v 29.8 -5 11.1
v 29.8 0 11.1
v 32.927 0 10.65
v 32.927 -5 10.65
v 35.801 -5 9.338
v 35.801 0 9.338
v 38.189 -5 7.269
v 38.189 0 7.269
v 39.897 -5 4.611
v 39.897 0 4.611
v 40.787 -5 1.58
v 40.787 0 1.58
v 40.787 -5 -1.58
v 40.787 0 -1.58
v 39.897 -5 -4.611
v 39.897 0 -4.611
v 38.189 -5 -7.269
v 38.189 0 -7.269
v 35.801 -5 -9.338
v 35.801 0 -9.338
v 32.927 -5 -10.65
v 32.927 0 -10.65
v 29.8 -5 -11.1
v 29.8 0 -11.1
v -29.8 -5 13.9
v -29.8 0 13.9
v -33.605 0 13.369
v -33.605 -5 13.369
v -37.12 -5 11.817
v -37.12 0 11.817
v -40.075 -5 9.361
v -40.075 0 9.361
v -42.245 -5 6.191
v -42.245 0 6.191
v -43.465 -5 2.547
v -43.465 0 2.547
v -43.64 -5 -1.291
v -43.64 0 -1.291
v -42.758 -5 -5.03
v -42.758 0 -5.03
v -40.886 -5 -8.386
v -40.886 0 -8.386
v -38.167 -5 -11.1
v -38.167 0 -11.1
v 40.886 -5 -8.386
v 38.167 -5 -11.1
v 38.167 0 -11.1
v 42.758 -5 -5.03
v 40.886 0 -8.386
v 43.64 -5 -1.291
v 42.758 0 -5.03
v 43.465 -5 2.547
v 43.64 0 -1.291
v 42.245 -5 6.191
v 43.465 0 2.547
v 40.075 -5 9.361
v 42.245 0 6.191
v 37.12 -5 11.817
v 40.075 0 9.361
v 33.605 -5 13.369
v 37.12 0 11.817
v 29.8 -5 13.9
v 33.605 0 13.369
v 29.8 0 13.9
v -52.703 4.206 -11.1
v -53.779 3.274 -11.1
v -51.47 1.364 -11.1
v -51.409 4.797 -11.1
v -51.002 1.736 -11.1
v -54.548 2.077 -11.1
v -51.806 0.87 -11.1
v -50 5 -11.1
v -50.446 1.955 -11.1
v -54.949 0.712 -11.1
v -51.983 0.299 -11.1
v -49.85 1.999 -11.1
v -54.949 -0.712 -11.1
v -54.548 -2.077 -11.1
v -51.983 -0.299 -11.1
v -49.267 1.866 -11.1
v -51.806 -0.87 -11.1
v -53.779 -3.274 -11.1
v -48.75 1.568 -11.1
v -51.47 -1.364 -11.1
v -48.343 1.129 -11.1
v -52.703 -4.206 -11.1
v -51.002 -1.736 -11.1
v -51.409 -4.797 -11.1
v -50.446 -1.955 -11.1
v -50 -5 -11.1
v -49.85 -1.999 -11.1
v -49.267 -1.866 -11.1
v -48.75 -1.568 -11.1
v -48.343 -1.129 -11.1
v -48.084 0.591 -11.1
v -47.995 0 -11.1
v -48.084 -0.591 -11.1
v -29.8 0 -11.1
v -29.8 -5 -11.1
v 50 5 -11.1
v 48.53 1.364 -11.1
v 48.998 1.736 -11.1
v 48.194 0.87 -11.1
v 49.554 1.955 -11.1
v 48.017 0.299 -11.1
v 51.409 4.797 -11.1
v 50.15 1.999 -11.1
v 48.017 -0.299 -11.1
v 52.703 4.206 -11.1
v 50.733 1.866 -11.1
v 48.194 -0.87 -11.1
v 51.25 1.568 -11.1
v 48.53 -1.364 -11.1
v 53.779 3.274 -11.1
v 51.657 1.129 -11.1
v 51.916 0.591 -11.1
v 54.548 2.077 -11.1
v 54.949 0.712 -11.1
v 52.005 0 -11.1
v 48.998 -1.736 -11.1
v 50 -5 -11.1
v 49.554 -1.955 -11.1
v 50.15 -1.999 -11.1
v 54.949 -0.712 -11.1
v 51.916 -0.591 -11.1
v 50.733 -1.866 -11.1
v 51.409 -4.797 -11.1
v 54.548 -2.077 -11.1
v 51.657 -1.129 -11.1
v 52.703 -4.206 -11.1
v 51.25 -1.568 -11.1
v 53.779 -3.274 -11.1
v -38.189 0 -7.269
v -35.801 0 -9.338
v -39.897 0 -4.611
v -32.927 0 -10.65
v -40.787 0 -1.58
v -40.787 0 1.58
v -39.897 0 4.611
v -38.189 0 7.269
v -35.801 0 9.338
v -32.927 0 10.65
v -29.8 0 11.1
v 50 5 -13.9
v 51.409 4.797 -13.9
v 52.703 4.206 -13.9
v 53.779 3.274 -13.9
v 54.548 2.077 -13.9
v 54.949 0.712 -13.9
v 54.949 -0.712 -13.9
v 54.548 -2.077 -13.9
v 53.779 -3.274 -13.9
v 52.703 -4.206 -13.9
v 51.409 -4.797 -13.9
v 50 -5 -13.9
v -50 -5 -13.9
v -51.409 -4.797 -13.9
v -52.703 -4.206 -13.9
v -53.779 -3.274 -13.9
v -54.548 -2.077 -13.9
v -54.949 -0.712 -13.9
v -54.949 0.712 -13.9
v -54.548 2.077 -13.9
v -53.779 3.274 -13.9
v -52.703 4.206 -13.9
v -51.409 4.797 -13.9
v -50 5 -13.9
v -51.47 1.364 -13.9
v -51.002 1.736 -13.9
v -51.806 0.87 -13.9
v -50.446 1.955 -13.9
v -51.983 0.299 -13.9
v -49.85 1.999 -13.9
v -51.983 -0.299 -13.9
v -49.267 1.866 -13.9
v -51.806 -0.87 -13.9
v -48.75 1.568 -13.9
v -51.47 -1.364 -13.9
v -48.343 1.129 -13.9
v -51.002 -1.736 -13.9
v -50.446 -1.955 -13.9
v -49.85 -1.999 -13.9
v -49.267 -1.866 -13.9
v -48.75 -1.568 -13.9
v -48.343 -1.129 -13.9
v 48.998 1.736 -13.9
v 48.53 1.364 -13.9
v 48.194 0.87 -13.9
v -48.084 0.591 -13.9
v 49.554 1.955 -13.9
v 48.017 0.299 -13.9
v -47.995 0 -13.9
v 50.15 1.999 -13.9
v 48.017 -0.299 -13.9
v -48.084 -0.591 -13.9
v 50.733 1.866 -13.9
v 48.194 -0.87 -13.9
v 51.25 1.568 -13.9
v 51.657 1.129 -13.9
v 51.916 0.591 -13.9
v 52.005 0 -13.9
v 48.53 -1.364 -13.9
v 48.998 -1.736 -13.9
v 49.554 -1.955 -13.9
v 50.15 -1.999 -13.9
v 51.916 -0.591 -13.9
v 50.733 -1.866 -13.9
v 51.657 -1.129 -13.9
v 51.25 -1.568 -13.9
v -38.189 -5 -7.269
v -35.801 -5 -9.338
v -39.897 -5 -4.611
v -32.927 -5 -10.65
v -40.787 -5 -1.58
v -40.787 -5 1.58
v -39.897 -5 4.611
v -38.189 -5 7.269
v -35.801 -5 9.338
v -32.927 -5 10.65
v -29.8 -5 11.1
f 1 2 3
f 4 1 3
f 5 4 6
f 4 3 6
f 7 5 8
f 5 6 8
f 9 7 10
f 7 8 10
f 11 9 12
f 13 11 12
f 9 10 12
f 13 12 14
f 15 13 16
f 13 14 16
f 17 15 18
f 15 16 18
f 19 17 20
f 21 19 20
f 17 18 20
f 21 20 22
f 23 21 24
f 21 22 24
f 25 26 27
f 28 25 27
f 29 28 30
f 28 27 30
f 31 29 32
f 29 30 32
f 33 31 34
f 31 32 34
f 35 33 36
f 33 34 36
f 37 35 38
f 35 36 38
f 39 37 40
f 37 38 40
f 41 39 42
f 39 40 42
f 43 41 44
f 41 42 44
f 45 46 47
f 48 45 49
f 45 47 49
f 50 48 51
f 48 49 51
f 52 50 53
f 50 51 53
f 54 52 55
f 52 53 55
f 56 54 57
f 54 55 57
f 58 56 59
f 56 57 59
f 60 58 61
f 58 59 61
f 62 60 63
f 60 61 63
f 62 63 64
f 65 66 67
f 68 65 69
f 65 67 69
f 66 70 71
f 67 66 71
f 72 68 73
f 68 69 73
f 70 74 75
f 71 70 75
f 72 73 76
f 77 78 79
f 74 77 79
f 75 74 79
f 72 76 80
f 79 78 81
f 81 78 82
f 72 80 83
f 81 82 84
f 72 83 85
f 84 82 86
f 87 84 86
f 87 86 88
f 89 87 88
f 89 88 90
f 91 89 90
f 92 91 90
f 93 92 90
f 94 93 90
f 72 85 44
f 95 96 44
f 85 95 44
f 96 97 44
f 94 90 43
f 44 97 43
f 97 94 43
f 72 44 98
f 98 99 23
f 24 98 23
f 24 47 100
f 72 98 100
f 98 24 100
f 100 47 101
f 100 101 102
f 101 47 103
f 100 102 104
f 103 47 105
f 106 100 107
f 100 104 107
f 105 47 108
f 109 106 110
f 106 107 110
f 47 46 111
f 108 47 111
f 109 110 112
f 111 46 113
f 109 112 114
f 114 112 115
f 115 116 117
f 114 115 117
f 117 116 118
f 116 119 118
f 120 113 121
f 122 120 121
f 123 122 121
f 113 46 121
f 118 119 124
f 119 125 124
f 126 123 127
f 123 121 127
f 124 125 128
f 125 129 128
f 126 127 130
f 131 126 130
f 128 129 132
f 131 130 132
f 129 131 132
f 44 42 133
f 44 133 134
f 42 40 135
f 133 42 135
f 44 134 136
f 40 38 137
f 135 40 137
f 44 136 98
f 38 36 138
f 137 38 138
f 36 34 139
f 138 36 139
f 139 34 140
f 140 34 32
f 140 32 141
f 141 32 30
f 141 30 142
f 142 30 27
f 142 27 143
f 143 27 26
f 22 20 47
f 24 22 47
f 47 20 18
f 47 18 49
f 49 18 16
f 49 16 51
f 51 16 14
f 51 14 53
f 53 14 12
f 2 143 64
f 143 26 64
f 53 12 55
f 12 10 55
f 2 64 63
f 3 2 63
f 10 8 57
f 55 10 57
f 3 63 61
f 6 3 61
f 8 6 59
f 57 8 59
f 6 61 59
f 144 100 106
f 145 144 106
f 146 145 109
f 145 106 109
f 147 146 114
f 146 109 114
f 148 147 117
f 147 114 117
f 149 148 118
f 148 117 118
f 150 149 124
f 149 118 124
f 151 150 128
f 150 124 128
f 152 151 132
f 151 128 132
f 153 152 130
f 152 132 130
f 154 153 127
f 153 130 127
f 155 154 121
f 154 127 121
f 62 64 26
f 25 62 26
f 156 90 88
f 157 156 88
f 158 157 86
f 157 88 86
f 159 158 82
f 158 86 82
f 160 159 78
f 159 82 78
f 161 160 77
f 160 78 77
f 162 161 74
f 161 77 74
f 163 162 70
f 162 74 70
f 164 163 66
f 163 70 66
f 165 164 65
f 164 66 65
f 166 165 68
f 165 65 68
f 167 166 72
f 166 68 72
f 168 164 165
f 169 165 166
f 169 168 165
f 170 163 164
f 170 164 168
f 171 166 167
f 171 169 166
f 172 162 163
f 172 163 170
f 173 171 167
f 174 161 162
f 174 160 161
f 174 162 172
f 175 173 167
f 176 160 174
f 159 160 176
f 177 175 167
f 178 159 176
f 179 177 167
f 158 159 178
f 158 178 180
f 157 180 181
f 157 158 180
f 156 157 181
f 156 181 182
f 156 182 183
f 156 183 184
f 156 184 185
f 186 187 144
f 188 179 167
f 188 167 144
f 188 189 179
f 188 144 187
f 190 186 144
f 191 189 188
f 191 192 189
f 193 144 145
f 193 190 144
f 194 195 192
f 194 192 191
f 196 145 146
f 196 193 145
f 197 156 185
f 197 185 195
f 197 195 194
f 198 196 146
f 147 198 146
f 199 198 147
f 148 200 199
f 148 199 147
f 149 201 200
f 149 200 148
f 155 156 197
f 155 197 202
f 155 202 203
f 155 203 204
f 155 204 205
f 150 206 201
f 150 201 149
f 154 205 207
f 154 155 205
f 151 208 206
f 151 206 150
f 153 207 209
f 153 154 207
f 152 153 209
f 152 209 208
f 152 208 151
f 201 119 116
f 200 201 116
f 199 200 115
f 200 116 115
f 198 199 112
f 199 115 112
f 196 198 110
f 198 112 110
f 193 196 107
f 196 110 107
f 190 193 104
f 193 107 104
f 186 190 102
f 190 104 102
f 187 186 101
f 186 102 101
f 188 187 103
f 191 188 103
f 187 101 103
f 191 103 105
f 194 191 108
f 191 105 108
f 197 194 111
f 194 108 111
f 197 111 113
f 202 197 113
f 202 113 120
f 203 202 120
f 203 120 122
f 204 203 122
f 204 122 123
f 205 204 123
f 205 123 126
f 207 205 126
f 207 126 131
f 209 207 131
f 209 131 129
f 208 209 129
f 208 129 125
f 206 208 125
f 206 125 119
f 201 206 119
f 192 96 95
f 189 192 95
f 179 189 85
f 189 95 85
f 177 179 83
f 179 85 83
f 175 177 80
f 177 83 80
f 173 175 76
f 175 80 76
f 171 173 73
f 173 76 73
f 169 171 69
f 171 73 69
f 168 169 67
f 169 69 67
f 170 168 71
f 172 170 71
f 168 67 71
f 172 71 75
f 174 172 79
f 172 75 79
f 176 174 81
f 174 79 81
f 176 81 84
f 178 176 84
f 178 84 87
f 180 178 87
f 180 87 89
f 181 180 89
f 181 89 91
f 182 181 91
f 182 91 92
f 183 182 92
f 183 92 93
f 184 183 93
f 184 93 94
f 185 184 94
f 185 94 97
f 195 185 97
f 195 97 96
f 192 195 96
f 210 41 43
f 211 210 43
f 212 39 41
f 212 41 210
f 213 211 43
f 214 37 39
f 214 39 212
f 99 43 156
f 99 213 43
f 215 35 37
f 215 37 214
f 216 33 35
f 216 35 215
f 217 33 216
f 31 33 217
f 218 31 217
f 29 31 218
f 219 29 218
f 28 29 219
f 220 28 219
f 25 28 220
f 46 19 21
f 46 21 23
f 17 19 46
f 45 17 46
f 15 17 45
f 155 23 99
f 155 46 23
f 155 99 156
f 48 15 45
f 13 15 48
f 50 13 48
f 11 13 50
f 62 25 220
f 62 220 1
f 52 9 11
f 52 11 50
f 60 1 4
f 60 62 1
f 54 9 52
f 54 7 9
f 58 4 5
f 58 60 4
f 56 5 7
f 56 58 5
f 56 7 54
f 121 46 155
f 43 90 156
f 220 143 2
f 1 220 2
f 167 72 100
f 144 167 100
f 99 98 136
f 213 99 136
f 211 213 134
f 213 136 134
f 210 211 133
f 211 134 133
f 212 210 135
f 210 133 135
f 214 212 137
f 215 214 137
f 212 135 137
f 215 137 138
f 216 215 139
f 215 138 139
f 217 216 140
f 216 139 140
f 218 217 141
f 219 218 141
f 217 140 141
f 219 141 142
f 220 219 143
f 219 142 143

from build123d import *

# Parameters (mm, degrees)
F1_DEPTH = 5
F2_W     = 120
F2_H     = 2.8
F3_DEPTH = 10
F4_R     = 2.005
F5_DEPTH = 2.801
F7_DEPTH = 2.801


with BuildPart() as f1:
    # F0 (on Front) → F1 (new body)
    with BuildSketch(Plane.XZ):
        with BuildLine():
            Line((-29.8, -13.9), (29.8, -13.9))
            ThreePointArc((29.8, -13.9), (43.7, 0), (29.8, 13.9))
            Line((29.8, 13.9), (-29.8, 13.9))
            ThreePointArc((-29.8, 13.9), (-43.7, 0), (-29.8, -13.9))
        make_face()
        with BuildLine():
            ThreePointArc((29.8, 11.1), (40.9, 0), (29.8, -11.1))
            Line((29.8, -11.1), (-29.8, -11.1))
            ThreePointArc((-29.8, -11.1), (-40.9, 0), (-29.8, 11.1))
            Line((-29.8, 11.1), (29.8, 11.1))
        make_face(mode=Mode.SUBTRACT)
    extrude(amount=F1_DEPTH)

    # F2 (on face) → F3 (join)
    with BuildSketch(Plane.XZ.offset(5)):
        with Locations((0, -12.5)):
            Rectangle(F2_W, F2_H)
    extrude(amount=-F3_DEPTH)

    # F4 (on face) → F5 (cut, through all)
    with BuildSketch(Plane.XY.offset(-11.1)):
        with Locations((50, 0)):
            Circle(F4_R)
        with Locations((-50, 0)):
            Circle(F4_R)
    extrude(amount=-F5_DEPTH, mode=Mode.SUBTRACT)

    # F6 (on face) → F7 (cut, through all)
    with BuildSketch(Plane.XY.offset(-11.1)):
        with BuildLine():
            ThreePointArc((-50, -5), (-55, 0), (-50, 5))
            Line((-50, 5), (-60, 5))
            Line((-60, 5), (-60, -5))
            Line((-60, -5), (-50, -5))
        make_face()
        with BuildLine():
            Line((60, 5), (50, 5))
            ThreePointArc((50, 5), (55, 0), (50, -5))
            Line((50, -5), (60, -5))
            Line((60, -5), (60, 5))
        make_face()
    extrude(amount=-F7_DEPTH, mode=Mode.SUBTRACT)


solid = f1.part
